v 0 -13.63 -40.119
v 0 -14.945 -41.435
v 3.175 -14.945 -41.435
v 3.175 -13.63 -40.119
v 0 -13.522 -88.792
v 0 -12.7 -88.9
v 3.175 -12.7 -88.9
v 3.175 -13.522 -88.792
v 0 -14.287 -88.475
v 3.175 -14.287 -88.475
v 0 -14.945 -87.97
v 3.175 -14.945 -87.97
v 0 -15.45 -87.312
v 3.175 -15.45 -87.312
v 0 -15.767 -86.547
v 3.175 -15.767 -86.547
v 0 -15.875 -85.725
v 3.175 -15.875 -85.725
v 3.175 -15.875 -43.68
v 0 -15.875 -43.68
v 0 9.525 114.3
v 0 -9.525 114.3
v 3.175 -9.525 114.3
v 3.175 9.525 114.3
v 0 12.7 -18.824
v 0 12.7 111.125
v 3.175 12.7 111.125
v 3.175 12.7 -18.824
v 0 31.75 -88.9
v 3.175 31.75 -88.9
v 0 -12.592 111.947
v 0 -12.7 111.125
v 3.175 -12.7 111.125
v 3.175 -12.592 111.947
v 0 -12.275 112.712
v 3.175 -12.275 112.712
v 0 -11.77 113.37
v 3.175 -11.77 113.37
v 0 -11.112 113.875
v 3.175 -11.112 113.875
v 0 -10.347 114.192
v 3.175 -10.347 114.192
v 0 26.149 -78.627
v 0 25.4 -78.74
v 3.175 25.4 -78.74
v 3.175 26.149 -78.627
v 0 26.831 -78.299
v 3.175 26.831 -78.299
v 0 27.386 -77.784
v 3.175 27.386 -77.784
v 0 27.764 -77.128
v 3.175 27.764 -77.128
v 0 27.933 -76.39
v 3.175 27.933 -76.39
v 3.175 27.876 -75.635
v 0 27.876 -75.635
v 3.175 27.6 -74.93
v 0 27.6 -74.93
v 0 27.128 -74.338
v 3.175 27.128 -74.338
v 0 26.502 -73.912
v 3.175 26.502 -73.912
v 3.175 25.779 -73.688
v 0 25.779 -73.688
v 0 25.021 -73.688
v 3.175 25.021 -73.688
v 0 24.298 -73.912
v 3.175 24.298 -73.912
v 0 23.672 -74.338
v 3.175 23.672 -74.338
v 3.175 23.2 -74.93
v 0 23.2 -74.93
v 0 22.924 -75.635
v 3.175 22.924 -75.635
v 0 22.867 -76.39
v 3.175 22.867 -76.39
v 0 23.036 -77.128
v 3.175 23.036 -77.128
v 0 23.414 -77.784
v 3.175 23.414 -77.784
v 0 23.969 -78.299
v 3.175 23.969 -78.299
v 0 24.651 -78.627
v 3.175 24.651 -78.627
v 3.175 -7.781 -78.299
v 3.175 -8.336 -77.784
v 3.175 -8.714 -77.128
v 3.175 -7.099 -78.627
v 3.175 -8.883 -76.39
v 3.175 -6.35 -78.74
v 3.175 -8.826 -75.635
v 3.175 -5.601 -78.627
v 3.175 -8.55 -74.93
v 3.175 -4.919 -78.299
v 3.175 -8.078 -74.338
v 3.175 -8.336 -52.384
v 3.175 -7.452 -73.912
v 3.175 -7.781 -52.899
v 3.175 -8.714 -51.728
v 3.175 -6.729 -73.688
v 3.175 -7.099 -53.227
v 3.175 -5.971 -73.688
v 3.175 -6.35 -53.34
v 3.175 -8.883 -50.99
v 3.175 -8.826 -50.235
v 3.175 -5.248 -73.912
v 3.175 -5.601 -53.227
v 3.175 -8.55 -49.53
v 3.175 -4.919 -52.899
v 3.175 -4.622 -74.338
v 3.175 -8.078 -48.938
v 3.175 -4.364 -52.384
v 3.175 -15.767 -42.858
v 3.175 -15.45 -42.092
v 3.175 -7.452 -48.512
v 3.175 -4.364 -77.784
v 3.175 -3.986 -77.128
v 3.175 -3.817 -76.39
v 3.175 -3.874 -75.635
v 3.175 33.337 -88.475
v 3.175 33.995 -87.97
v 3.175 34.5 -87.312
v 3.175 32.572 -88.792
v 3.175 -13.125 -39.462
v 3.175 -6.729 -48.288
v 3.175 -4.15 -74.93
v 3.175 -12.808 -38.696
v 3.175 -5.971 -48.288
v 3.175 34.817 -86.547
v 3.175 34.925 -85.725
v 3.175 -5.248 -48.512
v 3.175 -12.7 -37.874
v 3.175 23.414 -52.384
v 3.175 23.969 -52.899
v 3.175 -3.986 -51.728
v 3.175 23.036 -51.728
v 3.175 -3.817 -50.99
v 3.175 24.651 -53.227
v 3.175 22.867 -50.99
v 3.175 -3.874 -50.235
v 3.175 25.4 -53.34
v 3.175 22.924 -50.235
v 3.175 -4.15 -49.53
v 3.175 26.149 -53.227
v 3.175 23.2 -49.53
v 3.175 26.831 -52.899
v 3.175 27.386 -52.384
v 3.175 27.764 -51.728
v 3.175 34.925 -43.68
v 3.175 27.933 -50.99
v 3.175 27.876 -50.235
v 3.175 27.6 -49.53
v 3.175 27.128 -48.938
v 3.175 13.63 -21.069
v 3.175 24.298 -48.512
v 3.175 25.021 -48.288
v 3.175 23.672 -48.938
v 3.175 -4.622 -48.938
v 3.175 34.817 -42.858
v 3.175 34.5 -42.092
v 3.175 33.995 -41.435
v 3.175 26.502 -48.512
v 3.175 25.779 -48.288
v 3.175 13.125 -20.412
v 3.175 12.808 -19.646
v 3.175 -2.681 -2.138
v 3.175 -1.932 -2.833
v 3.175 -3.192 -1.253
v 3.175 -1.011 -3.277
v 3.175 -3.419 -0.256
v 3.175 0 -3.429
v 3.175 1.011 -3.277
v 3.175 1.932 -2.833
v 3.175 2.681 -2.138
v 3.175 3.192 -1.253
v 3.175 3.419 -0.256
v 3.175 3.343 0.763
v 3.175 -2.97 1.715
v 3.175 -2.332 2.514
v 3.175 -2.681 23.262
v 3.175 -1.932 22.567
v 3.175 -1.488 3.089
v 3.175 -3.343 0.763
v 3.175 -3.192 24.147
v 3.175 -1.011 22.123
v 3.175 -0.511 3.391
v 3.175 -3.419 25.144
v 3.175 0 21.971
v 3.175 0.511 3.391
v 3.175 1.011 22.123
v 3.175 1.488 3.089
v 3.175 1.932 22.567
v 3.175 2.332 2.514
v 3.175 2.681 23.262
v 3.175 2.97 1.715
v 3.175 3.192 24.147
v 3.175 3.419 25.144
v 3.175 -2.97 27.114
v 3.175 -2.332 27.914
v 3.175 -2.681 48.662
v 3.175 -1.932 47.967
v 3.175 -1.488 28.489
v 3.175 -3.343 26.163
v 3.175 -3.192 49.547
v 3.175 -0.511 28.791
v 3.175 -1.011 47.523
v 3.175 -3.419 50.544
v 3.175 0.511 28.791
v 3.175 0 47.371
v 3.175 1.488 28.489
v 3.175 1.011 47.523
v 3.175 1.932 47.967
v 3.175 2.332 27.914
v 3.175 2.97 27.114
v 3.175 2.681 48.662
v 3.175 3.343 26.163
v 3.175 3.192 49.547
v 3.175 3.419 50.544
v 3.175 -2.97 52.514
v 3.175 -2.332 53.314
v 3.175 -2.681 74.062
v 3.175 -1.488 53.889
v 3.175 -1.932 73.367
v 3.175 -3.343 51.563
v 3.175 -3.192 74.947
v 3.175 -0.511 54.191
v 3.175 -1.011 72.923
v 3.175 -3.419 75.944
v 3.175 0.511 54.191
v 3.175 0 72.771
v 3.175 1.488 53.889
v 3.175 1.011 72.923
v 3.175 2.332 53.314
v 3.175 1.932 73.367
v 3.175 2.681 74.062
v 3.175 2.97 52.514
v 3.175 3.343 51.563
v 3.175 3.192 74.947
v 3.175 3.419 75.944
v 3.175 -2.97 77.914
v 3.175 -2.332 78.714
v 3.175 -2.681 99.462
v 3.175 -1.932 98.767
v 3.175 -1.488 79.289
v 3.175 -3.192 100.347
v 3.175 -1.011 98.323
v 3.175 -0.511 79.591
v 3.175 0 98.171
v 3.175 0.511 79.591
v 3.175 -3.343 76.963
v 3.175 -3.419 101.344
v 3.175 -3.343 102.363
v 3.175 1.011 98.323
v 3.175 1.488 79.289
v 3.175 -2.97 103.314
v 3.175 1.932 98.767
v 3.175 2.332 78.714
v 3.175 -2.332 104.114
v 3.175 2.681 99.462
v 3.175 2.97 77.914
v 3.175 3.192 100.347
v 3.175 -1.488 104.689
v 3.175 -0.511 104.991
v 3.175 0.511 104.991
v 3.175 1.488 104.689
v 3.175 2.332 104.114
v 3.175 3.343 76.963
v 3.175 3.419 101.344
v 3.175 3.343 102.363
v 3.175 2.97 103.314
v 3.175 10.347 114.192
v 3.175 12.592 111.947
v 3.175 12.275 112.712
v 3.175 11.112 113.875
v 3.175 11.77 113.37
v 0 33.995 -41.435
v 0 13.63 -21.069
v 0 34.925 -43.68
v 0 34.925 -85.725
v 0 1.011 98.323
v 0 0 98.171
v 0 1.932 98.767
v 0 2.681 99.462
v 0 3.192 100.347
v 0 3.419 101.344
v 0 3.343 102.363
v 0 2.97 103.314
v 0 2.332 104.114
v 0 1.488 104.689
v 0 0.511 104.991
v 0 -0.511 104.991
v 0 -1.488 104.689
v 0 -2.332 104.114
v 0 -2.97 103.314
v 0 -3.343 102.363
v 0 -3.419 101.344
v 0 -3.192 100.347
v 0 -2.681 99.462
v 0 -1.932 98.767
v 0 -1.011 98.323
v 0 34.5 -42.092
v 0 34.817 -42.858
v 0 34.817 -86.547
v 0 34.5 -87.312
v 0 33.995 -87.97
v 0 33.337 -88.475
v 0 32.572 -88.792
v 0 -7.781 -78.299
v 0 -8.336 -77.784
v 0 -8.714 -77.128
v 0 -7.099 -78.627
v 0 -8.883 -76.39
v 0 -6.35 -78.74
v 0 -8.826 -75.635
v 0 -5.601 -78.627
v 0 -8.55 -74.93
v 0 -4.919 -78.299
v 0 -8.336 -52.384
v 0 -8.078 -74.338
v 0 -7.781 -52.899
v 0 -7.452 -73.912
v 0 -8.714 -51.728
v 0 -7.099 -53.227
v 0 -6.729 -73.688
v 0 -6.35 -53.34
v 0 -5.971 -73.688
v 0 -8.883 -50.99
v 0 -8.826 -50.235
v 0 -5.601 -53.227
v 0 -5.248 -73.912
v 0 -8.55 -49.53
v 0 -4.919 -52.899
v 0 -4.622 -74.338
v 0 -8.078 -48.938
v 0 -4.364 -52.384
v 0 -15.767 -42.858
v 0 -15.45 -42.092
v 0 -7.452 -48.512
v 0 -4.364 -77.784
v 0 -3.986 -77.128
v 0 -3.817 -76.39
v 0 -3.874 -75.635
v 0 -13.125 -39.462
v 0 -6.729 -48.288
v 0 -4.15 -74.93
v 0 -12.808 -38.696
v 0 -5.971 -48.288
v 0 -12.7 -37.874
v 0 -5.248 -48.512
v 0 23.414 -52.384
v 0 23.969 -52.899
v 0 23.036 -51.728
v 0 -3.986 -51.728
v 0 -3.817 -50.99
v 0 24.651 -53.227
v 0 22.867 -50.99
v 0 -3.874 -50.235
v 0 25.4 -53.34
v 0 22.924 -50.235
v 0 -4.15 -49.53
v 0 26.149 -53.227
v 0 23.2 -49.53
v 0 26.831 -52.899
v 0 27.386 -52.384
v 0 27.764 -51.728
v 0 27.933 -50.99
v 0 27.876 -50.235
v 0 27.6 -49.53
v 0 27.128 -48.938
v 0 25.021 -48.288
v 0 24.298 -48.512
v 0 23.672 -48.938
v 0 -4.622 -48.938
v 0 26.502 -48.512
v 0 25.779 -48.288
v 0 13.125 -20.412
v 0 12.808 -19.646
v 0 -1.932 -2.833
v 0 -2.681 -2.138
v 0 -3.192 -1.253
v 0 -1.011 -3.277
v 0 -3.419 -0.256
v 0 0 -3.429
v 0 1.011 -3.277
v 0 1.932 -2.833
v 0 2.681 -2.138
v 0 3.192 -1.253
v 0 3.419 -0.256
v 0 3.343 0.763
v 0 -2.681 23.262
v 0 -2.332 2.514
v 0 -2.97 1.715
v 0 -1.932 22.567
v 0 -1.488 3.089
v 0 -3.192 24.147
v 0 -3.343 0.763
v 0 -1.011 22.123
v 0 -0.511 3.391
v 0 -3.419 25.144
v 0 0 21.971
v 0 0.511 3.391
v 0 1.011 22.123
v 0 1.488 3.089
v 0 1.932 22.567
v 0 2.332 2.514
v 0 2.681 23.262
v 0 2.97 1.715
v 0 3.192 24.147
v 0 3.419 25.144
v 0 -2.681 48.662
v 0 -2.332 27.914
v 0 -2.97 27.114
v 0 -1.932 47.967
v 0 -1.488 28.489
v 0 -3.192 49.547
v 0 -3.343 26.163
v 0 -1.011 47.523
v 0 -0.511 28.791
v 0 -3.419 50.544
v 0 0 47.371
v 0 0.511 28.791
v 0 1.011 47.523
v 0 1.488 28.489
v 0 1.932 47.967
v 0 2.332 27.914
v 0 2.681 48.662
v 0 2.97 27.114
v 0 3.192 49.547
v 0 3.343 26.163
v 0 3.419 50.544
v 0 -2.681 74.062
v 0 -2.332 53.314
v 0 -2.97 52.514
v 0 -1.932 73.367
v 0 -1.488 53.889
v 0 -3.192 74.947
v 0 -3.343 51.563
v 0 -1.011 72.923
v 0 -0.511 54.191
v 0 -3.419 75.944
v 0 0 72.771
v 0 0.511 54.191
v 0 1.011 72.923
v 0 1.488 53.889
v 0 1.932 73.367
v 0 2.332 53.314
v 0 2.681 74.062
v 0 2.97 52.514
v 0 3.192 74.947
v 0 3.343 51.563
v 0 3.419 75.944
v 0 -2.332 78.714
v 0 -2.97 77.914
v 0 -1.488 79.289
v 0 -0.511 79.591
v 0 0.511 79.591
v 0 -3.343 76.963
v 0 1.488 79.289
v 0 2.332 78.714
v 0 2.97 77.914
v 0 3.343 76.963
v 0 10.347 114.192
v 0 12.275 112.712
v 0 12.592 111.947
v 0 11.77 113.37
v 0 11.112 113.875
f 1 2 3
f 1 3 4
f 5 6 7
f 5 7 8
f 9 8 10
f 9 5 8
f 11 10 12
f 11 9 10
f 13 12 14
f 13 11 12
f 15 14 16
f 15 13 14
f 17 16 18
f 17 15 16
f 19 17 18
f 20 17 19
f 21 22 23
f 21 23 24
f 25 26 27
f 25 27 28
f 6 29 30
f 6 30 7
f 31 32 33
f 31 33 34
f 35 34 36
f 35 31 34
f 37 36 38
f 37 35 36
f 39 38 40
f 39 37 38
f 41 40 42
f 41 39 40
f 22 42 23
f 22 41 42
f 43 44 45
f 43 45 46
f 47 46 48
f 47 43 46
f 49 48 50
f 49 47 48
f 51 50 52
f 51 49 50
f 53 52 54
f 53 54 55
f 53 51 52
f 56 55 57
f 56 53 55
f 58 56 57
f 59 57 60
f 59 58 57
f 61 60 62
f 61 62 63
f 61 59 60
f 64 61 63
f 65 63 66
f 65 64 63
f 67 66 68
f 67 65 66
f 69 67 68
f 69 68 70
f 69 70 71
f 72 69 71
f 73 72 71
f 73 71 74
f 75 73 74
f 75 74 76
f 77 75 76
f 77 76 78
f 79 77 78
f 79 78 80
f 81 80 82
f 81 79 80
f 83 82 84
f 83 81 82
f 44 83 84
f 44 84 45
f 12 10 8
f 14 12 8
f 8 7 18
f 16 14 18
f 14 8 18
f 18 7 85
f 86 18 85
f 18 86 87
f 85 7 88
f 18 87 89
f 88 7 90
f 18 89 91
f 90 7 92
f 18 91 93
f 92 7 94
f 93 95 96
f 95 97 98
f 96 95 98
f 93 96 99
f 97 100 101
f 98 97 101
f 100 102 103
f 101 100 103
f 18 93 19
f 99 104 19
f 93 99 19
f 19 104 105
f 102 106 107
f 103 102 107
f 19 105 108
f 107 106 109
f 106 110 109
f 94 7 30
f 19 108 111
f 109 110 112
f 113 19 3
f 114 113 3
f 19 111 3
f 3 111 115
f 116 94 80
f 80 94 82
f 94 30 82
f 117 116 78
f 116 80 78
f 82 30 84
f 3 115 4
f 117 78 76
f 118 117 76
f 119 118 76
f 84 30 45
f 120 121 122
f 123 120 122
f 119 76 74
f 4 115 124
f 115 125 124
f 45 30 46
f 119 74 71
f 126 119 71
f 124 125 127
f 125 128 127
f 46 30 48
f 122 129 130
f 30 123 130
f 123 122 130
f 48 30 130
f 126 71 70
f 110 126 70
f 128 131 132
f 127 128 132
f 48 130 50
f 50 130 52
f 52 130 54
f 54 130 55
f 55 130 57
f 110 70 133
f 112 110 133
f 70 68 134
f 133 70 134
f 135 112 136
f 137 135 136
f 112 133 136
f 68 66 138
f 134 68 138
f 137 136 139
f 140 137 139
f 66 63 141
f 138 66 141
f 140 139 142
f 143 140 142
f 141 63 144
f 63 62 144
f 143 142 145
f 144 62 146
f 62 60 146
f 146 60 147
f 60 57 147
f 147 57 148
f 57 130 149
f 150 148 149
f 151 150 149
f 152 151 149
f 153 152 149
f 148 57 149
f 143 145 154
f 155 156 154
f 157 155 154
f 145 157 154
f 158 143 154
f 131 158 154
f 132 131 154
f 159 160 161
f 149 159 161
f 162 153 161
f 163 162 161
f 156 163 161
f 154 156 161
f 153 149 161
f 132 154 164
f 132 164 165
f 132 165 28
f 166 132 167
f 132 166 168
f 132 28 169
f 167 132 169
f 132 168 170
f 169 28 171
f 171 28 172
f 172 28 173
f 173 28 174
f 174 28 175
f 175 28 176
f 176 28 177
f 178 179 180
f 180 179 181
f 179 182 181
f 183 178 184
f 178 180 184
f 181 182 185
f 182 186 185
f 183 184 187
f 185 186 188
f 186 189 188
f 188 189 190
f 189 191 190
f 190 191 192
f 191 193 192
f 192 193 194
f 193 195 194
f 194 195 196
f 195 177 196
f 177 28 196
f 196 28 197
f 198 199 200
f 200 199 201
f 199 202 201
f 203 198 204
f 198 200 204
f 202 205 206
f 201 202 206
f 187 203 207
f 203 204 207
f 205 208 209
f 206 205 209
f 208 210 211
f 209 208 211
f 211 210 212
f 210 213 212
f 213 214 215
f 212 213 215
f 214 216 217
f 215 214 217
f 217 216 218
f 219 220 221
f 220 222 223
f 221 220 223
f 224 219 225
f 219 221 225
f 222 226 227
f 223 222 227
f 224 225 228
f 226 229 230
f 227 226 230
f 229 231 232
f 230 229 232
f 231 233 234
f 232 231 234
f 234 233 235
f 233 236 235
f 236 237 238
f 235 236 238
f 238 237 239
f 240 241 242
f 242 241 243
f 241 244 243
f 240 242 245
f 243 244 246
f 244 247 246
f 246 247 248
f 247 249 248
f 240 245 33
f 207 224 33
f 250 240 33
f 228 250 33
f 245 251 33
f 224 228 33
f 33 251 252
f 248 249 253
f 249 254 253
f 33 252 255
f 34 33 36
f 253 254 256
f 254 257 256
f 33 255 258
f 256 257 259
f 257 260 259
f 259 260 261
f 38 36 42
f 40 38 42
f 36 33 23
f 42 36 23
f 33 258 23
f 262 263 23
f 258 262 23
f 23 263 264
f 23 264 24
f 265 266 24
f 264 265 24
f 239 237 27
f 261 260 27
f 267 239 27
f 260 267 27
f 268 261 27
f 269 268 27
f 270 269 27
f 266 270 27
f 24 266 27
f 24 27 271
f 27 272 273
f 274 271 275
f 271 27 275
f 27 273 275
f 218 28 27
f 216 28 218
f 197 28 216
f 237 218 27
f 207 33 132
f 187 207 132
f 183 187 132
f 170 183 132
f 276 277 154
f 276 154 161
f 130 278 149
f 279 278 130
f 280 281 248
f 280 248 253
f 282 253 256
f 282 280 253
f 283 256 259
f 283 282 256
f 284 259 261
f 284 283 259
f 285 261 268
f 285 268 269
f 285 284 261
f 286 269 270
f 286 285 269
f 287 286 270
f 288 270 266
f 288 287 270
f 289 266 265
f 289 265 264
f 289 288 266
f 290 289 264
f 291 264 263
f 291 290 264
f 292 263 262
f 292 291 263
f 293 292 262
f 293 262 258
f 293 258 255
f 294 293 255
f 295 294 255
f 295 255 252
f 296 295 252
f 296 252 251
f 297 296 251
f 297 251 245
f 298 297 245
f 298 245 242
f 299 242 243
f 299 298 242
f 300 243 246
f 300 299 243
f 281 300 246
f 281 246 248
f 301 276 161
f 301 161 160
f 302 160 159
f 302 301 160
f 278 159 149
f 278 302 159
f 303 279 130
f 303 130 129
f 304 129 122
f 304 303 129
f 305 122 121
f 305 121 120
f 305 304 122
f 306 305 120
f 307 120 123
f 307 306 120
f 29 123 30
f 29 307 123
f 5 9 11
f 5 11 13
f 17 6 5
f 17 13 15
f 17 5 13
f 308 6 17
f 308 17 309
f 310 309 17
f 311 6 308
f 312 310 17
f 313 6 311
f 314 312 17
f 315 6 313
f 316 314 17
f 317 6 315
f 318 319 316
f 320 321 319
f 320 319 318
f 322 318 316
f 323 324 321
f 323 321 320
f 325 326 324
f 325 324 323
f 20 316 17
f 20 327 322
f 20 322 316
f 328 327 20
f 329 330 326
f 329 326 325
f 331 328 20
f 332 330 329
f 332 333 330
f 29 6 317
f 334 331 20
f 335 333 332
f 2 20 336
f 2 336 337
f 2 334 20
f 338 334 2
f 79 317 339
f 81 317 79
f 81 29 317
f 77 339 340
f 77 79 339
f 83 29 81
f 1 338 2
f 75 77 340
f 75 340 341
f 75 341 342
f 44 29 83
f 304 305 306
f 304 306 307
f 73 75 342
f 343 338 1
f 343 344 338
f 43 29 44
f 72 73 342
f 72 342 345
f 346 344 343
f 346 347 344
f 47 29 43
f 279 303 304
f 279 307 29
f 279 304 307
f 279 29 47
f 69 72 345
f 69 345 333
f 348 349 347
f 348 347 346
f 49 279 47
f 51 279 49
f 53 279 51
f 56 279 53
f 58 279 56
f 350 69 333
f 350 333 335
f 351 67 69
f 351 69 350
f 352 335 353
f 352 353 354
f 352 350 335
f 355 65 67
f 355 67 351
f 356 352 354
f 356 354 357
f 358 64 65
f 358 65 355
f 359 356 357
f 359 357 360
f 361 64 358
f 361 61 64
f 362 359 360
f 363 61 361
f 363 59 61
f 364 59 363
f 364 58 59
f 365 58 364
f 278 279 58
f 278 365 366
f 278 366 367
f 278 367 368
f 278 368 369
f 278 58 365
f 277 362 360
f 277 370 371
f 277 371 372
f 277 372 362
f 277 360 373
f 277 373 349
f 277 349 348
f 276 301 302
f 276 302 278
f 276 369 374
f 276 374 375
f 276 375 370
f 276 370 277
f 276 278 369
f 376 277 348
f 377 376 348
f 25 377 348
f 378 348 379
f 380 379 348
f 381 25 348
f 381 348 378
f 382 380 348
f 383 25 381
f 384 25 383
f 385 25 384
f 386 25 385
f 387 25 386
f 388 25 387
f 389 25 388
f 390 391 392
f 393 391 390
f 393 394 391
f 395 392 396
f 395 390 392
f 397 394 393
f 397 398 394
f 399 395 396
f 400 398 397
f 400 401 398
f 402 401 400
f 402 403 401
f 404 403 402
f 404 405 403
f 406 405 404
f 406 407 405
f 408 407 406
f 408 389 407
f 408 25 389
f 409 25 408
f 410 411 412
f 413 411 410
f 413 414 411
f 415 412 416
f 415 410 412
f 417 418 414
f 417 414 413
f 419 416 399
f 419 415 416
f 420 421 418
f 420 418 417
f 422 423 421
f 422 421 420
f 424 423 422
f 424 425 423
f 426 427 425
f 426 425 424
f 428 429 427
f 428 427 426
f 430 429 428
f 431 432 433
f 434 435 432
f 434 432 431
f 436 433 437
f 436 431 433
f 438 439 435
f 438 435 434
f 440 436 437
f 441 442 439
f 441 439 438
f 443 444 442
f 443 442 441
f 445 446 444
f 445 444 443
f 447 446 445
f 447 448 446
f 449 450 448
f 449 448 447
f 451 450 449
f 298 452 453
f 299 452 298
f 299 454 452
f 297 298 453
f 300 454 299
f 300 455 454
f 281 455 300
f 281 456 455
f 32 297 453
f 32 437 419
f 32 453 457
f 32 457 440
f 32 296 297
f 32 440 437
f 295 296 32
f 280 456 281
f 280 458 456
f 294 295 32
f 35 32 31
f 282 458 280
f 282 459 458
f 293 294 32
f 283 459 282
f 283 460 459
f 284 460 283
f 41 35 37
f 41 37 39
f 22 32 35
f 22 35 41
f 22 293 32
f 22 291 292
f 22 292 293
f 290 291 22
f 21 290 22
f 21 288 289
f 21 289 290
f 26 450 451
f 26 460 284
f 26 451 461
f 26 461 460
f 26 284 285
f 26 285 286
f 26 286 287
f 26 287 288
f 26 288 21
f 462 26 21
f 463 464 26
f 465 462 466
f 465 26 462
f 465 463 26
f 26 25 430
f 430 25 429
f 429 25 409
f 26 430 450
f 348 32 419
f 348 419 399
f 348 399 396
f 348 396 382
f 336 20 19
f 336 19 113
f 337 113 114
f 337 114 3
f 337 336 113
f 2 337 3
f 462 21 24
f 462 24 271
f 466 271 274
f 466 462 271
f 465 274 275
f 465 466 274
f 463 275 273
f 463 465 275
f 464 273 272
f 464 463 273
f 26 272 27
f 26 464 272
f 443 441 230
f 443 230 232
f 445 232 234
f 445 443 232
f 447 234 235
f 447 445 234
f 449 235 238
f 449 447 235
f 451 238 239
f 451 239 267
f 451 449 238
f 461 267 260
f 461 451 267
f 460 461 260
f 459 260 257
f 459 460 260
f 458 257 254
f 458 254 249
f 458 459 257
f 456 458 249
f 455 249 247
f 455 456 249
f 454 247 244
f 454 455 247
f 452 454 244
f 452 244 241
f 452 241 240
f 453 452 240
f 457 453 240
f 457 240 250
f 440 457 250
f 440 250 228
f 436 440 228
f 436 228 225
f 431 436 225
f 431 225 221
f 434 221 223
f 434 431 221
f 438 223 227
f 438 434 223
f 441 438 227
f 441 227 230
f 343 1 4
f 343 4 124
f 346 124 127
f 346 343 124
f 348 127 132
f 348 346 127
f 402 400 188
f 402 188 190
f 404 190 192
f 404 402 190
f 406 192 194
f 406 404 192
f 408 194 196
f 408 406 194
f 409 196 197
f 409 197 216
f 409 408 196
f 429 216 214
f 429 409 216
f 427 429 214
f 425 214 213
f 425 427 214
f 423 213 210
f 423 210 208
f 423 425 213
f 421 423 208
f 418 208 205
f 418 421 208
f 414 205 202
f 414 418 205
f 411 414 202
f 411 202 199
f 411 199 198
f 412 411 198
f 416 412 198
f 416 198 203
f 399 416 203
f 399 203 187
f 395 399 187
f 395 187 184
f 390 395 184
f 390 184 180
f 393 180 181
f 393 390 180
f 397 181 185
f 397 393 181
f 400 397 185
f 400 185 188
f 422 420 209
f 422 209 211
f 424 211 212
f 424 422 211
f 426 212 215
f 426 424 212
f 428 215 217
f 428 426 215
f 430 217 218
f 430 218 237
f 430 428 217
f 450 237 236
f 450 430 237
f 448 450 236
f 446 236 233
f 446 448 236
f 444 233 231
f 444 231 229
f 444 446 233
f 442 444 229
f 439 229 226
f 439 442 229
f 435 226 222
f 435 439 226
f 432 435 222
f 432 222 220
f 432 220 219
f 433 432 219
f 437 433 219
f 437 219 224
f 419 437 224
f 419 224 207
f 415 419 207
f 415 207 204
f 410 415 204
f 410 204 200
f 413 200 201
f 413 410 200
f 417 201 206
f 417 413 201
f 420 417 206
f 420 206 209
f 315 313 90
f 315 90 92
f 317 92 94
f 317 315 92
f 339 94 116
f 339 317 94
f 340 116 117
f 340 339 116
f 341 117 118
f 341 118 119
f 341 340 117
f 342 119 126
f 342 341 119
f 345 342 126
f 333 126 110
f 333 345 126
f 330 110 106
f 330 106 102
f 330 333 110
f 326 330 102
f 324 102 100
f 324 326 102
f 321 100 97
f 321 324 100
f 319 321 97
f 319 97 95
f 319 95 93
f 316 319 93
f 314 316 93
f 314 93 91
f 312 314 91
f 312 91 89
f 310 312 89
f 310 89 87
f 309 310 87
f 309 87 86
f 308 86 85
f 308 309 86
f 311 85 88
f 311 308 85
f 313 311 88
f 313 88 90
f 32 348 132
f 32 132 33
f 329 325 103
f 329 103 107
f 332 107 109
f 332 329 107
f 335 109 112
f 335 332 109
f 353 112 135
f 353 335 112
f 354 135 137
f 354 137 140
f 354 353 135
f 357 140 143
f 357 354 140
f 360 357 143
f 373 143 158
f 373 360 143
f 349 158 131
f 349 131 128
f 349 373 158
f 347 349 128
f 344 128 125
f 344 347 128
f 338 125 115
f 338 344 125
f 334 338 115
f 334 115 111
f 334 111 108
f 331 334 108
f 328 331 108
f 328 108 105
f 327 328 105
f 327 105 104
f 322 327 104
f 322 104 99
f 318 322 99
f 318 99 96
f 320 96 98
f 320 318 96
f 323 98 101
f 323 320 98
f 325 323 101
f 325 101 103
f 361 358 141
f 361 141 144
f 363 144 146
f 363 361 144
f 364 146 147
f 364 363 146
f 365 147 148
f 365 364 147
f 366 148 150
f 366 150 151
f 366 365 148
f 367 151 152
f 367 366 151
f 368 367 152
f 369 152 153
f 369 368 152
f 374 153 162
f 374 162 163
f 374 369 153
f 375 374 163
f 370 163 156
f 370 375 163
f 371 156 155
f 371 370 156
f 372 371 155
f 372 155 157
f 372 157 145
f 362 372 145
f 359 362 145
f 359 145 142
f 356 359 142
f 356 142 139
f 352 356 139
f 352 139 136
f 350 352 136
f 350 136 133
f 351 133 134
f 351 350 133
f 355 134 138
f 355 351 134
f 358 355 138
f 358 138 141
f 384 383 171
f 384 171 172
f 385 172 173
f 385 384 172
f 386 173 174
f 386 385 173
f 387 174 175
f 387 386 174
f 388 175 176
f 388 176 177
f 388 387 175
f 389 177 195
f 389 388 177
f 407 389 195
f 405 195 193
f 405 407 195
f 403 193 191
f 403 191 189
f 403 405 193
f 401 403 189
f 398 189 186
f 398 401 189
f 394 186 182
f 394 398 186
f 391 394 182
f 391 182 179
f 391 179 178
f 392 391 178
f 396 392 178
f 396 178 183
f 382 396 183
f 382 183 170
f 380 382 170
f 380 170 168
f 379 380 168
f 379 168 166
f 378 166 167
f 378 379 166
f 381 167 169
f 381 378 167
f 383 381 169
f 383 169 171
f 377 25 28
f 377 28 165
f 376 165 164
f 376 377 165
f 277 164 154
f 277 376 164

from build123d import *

# Parameters (mm, degrees)
SKETCH2_R           = 3.429
SKETCH2_R_2         = 2.54
BOSS_EXTRUDE1_DEPTH = 3.175


with BuildPart() as part:
    # Sketch2 → Boss-Extrude1 (new body)
    with BuildSketch(Plane(origin=(0, 0, 0), x_dir=(0, 0, -1), z_dir=(1, 0, 0))):
        with BuildLine():
            Line((-111.125, 12.7), (18.824359697, 12.7))
            ThreePointArc((18.824359697, 12.7), (20.039379595, 12.941682484), (21.069423728, 13.62993597))
            Line((21.069423728, 13.62993597), (41.434551788, 33.99506403))
            ThreePointArc((41.434551788, 33.99506403), (42.464595921, 34.683317516), (43.679615818, 34.925))
            Line((43.679615818, 34.925), (85.725, 34.925))
            ThreePointArc((85.725, 34.925), (87.97006403, 33.99506403), (88.9, 31.75))
            Line((88.9, 31.75), (88.9, -12.7))
            ThreePointArc((88.9, -12.7), (87.97006403, -14.94506403), (85.725, -15.875))
            Line((85.725, -15.875), (43.679615818, -15.875))
            ThreePointArc((43.679615818, -15.875), (42.464595921, -15.633317516), (41.434551788, -14.94506403))
            Line((41.434551788, -14.94506403), (40.119423728, -13.62993597))
            ThreePointArc((40.119423728, -13.62993597), (39.089379595, -12.941682484), (37.874359697, -12.7))
            Line((37.874359697, -12.7), (-111.125, -12.7))
            ThreePointArc((-111.125, -12.7), (-113.37006403, -11.77006403), (-114.3, -9.525))
            Line((-114.3, -9.525), (-114.3, 9.525))
            ThreePointArc((-114.3, 9.525), (-113.37006403, 11.77006403), (-111.125, 12.7))
        make_face()
        with Locations((-101.6, 0)):
            Circle(SKETCH2_R, mode=Mode.SUBTRACT)
        with Locations((-76.2, 0)):
            Circle(SKETCH2_R, mode=Mode.SUBTRACT)
        with Locations((-50.8, 0)):
            Circle(SKETCH2_R, mode=Mode.SUBTRACT)
        with Locations((-25.4, 0)):
            Circle(SKETCH2_R, mode=Mode.SUBTRACT)
        Circle(SKETCH2_R, mode=Mode.SUBTRACT)
        with Locations((50.8, 25.4)):
            Circle(SKETCH2_R_2, mode=Mode.SUBTRACT)
        with Locations((76.2, 25.4)):
            Circle(SKETCH2_R_2, mode=Mode.SUBTRACT)
        with Locations((50.8, -6.35)):
            Circle(SKETCH2_R_2, mode=Mode.SUBTRACT)
        with Locations((76.2, -6.35)):
            Circle(SKETCH2_R_2, mode=Mode.SUBTRACT)
    extrude(amount=BOSS_EXTRUDE1_DEPTH)


solid = part.part
